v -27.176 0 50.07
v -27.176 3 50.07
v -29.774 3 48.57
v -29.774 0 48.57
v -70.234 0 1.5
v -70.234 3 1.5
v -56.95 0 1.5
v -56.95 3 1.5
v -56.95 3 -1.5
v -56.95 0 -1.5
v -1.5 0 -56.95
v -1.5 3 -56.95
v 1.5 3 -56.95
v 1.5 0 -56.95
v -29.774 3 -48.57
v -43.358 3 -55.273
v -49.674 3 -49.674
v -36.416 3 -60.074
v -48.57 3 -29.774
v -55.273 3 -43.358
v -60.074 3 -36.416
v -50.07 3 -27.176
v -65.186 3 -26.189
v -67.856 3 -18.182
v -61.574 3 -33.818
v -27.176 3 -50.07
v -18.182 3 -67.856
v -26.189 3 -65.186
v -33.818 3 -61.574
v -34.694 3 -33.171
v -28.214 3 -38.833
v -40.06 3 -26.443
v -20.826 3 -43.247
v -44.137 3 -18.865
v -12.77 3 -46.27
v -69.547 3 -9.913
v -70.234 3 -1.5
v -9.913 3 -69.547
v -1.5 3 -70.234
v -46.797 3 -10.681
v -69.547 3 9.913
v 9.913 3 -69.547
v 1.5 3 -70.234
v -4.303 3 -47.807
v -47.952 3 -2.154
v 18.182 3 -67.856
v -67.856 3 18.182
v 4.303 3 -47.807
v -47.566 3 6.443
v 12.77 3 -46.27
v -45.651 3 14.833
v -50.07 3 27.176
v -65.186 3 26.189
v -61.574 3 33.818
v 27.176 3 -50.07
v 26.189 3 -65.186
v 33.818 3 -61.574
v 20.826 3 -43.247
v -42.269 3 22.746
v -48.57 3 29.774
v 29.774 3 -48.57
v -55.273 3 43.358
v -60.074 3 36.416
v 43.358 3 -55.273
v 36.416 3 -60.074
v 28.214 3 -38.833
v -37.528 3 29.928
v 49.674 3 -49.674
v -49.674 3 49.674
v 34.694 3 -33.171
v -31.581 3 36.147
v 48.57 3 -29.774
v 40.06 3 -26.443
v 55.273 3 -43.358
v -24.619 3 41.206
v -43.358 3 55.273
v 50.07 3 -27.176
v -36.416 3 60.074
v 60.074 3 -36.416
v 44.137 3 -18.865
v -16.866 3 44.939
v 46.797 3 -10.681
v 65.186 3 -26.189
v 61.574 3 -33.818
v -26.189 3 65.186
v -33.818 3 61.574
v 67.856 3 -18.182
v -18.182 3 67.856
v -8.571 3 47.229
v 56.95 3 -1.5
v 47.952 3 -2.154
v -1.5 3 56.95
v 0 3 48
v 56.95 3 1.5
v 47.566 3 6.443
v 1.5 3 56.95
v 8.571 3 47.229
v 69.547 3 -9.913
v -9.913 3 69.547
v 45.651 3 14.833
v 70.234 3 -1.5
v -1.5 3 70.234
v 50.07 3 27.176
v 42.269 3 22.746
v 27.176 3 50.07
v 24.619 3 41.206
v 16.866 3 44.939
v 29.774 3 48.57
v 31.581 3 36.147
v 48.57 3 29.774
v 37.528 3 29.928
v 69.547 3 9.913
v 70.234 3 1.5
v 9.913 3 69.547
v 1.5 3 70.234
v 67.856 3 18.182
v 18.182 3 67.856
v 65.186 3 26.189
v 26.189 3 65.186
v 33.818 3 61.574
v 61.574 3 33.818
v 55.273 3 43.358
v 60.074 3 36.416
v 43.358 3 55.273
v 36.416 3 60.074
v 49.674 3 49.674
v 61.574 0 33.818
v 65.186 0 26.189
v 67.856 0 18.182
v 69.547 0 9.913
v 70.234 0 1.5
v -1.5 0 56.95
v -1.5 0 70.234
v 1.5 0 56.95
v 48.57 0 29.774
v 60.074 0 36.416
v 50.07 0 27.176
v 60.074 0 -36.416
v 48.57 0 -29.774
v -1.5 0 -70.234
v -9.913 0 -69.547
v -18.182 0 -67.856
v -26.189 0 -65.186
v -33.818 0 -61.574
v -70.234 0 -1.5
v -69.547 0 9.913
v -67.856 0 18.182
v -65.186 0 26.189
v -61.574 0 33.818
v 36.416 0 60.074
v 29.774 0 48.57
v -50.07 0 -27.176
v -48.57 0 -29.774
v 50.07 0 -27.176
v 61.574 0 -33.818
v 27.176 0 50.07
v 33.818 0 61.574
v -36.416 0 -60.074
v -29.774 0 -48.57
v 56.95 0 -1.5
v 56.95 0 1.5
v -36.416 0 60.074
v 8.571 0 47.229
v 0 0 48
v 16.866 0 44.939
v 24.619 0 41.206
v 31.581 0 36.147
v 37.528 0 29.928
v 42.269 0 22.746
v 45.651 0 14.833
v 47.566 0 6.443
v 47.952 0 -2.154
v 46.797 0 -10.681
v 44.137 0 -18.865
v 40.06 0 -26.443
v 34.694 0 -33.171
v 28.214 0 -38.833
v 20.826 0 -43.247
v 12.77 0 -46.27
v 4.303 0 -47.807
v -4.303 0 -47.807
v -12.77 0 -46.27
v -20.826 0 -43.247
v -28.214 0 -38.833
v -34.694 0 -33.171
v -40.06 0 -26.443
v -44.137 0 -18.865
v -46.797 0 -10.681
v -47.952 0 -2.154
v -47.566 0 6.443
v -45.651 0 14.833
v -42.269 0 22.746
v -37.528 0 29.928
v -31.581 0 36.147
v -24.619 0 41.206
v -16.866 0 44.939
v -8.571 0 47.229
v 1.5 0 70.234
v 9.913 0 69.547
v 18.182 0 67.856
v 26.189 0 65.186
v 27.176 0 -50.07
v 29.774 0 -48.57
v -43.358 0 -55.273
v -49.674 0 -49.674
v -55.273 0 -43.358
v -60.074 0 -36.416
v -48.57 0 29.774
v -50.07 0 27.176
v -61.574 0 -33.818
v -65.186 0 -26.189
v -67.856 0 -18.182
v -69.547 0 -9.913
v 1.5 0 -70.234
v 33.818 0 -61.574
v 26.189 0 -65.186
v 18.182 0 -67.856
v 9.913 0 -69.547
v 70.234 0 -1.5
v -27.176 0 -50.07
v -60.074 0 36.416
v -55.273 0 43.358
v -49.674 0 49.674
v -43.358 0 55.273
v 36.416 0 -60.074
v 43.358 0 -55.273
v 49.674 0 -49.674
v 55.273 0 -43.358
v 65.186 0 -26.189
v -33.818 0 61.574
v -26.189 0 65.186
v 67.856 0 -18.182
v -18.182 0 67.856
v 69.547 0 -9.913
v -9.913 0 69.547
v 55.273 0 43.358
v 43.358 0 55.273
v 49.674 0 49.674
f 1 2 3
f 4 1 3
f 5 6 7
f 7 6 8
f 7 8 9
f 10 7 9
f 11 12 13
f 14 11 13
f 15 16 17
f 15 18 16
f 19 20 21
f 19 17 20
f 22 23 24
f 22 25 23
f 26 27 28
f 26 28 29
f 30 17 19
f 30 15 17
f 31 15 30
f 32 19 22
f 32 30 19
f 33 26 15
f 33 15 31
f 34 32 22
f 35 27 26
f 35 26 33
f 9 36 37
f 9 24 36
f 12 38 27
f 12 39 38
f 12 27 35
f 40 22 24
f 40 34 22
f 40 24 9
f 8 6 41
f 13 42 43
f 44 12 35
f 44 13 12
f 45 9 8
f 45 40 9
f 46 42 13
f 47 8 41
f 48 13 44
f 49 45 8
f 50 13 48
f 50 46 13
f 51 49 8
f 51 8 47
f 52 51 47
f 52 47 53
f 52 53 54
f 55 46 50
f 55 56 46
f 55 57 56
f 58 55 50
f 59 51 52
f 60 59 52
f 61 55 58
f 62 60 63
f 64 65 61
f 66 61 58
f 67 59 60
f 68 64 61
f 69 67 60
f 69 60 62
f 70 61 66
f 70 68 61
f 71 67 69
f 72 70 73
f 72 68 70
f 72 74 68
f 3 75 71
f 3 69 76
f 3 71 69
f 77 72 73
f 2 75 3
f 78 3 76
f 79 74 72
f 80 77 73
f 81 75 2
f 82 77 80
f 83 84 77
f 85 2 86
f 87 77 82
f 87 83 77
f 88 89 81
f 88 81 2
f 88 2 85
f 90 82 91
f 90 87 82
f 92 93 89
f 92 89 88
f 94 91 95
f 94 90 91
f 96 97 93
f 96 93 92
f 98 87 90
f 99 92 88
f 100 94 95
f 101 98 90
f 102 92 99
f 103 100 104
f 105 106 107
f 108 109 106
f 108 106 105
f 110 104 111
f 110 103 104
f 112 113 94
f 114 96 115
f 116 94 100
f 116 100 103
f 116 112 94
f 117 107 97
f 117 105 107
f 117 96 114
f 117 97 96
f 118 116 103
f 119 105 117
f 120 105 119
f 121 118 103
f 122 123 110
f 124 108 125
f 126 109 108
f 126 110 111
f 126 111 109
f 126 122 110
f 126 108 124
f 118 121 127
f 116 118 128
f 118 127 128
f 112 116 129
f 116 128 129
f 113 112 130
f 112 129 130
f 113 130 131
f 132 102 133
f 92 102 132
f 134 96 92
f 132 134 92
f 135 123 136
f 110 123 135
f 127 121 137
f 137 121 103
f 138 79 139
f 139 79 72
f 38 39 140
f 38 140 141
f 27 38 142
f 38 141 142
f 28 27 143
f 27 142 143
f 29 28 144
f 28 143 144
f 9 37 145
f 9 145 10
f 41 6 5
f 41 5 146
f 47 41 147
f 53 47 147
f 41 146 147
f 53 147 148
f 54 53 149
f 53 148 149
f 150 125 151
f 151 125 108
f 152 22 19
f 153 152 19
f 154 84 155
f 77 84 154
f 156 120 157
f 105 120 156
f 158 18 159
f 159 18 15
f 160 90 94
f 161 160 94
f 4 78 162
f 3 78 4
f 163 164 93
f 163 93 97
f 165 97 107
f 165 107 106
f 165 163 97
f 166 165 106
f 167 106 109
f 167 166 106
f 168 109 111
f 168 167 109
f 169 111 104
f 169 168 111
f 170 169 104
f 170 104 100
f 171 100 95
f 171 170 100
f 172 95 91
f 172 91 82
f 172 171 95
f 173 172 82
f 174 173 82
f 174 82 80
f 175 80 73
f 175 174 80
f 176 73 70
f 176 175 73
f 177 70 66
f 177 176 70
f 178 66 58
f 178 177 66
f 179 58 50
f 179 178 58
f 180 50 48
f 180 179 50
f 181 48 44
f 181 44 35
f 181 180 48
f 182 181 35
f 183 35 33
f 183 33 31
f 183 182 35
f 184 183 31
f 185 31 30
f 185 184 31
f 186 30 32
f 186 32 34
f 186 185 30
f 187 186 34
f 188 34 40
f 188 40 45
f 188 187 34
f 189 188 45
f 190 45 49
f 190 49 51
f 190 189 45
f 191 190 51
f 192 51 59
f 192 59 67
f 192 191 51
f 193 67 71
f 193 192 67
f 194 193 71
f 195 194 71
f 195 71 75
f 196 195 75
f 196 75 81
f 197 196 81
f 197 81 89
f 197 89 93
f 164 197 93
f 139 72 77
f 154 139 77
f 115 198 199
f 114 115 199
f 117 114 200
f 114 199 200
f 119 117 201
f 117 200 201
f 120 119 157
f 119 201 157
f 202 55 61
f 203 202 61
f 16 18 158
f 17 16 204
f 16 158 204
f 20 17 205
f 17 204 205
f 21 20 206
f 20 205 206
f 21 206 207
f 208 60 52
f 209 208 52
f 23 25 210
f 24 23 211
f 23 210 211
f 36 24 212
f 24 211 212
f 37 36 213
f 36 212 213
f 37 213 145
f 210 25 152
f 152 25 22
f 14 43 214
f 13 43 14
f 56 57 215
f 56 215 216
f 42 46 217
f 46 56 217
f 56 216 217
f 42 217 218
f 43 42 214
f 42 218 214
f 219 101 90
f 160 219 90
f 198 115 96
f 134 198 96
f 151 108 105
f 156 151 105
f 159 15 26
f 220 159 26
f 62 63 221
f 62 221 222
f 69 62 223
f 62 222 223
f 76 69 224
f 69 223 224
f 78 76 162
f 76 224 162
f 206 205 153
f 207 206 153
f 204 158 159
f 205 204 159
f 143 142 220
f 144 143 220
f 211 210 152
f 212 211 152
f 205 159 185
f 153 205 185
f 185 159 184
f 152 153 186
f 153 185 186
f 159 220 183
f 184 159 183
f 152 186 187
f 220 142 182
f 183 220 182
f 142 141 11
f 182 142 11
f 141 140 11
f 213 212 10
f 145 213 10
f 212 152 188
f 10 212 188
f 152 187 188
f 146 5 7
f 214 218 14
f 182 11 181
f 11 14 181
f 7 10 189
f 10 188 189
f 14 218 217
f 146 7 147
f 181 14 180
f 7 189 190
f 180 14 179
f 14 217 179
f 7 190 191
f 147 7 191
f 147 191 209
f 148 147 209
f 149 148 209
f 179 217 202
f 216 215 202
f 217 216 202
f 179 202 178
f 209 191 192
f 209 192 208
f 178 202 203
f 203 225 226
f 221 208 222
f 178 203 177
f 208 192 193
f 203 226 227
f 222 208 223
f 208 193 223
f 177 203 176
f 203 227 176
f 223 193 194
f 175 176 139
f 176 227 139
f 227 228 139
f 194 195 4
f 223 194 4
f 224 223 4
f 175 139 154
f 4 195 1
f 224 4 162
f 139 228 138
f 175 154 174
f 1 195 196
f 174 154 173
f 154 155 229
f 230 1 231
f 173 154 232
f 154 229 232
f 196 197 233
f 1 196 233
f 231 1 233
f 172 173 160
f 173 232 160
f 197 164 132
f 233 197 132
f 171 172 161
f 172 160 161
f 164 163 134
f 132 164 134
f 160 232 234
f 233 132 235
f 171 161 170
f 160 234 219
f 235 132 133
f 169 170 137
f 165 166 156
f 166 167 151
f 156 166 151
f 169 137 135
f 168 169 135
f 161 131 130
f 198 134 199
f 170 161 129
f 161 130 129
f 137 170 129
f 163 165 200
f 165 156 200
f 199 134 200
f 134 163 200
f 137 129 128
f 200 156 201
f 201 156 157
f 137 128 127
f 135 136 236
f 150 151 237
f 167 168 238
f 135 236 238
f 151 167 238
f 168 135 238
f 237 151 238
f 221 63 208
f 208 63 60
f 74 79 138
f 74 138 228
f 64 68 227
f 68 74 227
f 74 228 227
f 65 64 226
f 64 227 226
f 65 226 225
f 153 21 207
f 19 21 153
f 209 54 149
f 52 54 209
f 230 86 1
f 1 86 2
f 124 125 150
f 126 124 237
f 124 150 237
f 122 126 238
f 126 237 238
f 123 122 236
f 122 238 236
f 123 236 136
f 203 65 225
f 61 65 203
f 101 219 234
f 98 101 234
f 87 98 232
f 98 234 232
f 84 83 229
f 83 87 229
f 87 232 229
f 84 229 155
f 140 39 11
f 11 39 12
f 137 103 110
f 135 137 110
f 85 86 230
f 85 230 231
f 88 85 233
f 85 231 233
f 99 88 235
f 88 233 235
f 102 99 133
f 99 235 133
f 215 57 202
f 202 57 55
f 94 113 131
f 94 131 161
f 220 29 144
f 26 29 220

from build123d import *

# Parameters (mm, degrees)
SKETCH1_R           = 70.25
SKETCH1_R_2         = 48
BOSS_EXTRUDE1_DEPTH = 3
SKETCH2_W           = 13.3
SKETCH2_H           = 3
CUT_EXTRUDE1_DEPTH  = 3
CIRPATTERN1_COUNT   = 12


with BuildPart() as part:
    # Sketch1 → Boss-Extrude1 (new body)
    with BuildSketch(Plane(origin=(0, 0, 0), x_dir=(1, 0, 0), z_dir=(0, 1, 0))):
        with Locations(Location((0, 0, 0), (0, 0, 270))):
            Circle(SKETCH1_R)
        with Locations(Location((0, 0, 0), (0, 0, 270))):
            Circle(SKETCH1_R_2, mode=Mode.SUBTRACT)
    extrude(amount=BOSS_EXTRUDE1_DEPTH)

    # Sketch2 → Cut-Extrude1 (cut)
    with BuildSketch(Plane(origin=(0, 3, 0), x_dir=(1, 0, 0), z_dir=(0, 1, 0))):
        with Locations((-63.6, 0)):
            Rectangle(SKETCH2_W, SKETCH2_H)
    cut_extrude1 = extrude(amount=-CUT_EXTRUDE1_DEPTH, mode=Mode.SUBTRACT)

    # CirPattern1: Cut-Extrude1 ×12 about axis
    cirpattern1_axis = Axis((0, 0, 0), (0, 1, 0))
    for i in range(1, CIRPATTERN1_COUNT):
        add(cut_extrude1.rotate(cirpattern1_axis, i * 360 / CIRPATTERN1_COUNT), mode=Mode.SUBTRACT)


solid = part.part
